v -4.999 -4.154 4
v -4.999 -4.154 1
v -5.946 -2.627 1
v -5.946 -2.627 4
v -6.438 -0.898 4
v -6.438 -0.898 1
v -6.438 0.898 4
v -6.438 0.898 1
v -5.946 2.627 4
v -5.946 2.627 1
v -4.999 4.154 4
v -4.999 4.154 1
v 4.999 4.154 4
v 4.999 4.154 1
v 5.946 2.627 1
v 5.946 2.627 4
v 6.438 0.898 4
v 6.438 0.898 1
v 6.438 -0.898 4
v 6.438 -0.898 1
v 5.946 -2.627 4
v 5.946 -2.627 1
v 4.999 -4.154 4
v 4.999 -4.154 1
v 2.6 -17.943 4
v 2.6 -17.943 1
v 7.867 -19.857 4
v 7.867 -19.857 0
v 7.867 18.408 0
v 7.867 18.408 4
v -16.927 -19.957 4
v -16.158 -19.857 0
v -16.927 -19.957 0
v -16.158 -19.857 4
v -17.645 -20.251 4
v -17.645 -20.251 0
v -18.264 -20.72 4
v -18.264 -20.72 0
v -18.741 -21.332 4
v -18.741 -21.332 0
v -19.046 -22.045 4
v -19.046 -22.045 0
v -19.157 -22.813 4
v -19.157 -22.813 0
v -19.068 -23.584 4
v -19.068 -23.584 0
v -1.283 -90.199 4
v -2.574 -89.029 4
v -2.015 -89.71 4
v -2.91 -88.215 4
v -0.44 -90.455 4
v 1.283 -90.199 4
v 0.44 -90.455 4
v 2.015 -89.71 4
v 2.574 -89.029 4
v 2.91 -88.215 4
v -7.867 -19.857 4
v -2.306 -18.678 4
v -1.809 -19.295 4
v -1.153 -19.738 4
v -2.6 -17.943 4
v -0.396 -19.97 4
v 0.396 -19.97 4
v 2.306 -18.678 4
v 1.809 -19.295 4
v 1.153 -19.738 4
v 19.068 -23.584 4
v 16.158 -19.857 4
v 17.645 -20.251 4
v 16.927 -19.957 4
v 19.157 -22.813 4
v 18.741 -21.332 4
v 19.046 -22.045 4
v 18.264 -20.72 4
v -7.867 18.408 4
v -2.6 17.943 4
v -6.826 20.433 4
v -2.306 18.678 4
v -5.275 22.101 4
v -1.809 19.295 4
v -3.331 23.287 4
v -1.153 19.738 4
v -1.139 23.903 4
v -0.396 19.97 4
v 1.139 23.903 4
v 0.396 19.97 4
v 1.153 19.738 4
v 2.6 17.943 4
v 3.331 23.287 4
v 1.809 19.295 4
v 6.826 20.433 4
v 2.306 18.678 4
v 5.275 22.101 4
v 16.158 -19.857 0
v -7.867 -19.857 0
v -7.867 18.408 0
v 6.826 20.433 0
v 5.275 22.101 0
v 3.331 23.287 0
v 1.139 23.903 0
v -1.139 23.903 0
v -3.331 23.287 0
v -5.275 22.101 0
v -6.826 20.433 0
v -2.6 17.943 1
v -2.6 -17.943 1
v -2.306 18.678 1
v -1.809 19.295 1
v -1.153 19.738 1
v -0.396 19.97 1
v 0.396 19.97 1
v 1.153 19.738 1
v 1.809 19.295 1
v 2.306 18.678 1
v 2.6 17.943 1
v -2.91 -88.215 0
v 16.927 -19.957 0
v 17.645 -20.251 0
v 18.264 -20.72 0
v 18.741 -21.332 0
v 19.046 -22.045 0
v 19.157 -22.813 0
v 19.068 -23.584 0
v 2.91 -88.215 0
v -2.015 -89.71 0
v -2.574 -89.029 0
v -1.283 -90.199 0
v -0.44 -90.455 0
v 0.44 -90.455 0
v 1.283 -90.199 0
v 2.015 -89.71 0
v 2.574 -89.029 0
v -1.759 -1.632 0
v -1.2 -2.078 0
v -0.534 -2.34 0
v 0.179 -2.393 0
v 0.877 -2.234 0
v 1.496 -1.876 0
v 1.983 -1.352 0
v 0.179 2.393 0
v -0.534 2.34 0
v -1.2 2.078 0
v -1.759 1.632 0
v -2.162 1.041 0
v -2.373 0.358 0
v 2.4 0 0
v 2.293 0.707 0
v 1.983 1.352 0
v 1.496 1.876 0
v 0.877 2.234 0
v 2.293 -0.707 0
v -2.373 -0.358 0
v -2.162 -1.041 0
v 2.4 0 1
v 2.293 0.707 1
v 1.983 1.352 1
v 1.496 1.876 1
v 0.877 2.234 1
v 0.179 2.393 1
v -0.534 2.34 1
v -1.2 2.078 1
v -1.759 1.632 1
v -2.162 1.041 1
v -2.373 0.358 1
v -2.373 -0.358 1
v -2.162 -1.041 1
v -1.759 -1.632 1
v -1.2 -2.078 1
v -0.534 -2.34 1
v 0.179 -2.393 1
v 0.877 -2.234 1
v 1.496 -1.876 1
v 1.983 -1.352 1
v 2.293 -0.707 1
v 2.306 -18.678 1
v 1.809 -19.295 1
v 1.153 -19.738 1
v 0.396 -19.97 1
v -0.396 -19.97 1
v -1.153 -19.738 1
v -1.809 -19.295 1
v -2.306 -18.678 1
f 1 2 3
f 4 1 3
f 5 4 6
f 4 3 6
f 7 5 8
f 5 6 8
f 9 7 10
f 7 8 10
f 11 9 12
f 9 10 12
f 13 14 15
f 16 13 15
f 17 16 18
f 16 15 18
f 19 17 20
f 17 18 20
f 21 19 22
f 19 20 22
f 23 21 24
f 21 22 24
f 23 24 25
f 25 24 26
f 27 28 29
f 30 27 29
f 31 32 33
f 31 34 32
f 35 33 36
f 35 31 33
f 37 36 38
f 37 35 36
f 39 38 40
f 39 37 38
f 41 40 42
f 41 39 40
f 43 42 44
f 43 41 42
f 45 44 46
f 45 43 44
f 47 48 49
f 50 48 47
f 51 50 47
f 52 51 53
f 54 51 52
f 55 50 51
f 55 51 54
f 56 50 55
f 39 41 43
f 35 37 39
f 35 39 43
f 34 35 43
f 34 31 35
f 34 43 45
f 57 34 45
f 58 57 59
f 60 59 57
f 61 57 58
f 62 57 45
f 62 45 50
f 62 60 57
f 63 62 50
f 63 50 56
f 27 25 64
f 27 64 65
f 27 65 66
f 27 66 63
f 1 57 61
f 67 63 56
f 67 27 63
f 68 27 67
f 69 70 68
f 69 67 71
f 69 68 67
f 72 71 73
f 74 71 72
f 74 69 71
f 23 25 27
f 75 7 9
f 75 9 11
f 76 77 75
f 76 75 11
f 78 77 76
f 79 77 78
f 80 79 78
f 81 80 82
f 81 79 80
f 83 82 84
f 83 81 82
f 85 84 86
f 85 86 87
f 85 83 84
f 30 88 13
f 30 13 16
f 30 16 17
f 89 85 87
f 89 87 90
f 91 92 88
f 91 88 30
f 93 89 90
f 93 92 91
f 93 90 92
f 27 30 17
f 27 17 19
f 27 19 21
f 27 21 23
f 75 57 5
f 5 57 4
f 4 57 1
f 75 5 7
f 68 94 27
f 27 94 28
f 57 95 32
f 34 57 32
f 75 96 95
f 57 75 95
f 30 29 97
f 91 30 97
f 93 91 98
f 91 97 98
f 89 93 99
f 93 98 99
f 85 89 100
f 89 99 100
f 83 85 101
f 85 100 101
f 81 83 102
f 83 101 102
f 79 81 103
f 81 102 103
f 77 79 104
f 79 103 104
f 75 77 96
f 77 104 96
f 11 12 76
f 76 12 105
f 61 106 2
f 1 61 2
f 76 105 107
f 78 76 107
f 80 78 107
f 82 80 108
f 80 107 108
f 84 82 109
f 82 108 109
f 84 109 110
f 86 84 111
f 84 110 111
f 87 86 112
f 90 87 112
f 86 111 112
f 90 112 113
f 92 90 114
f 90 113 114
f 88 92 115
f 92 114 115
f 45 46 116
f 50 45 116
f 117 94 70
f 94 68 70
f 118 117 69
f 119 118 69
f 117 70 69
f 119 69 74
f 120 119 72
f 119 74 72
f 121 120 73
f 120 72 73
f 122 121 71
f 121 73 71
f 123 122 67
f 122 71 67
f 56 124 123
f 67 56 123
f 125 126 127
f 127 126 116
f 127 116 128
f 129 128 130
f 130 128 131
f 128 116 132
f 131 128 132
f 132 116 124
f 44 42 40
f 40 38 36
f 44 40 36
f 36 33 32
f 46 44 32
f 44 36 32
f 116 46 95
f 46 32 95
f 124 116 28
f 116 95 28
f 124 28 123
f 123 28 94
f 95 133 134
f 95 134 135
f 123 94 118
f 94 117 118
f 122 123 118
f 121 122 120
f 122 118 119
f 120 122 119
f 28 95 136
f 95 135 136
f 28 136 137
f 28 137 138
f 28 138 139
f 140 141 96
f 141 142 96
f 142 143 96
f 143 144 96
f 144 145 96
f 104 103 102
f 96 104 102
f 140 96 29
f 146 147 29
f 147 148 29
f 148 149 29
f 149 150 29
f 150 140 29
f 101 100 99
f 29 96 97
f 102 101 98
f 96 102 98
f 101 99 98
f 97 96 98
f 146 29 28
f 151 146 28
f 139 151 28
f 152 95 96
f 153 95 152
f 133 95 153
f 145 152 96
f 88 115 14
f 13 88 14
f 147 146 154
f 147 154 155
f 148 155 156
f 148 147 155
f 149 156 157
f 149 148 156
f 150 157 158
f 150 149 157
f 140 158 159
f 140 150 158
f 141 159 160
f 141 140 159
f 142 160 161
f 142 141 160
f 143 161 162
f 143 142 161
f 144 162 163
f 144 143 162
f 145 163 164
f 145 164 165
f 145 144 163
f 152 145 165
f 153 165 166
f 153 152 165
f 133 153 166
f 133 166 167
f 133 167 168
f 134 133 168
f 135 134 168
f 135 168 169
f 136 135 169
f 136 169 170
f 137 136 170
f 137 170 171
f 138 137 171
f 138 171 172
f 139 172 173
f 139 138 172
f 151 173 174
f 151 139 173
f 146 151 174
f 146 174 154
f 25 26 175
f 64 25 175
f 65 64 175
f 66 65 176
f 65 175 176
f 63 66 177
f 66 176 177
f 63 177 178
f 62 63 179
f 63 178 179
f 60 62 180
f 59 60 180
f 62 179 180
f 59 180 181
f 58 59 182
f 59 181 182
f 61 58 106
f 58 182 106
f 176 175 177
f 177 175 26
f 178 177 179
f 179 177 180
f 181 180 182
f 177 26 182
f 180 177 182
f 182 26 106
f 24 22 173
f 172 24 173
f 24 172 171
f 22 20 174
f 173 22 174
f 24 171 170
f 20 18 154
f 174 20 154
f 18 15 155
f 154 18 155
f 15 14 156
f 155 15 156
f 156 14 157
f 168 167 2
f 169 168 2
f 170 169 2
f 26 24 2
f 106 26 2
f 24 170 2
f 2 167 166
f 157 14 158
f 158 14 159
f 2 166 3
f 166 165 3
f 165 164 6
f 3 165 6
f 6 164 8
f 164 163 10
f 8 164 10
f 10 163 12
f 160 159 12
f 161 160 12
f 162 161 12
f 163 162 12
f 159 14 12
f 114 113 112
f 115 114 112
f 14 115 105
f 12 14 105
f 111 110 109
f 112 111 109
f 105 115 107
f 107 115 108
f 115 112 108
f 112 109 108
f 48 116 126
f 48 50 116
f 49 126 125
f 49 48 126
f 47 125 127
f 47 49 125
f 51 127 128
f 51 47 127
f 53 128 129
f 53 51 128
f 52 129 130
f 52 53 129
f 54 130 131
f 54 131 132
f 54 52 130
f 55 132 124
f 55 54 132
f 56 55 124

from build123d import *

# Parameters (mm, degrees)
EXTRUDE_1_DEPTH = 4
SKETCH_2_R      = 2.4
EXTRUDE_2_DEPTH = 1
FILLET_1_R      = 3


with BuildPart() as part:
    # 草圖1 → 填料-伸長1 (new body)
    with BuildSketch(Plane.XY):
        with BuildLine():
            Line((-7.867443673, 18.408334232), (-7.867443673, -19.856671438))
            Line((-7.867443673, -19.856671438), (-20, -19.856671438))
            Line((-20, -19.856671438), (0, -99.856671438))
            Line((0, -99.856671438), (20, -19.856671438))
            Line((20, -19.856671438), (7.867443673, -19.856671438))
            Line((7.867443673, -19.856671438), (7.867443673, 18.408334232))
            ThreePointArc((7.867443673, 18.408334232), (0, 23.981275915), (-7.867443673, 18.408334232))
        make_face()
        with BuildLine():
            ThreePointArc((-4.999271035, -4.154189345), (-6.5, 0), (-4.999271035, 4.154189345))
            Line((-4.999271035, 4.154189345), (-2.6, 17.94275172))
            ThreePointArc((-2.6, 17.94275172), (0, 20), (2.6, 17.94275172))
            Line((2.6, 17.94275172), (4.999271035, 4.154189345))
            ThreePointArc((4.999271035, 4.154189345), (6.5, 0), (4.999271035, -4.154189345))
            Line((4.999271035, -4.154189345), (2.6, -17.94275172))
            ThreePointArc((2.6, -17.94275172), (0, -20), (-2.6, -17.94275172))
            Line((-2.6, -17.94275172), (-4.999271035, -4.154189345))
        make_face(mode=Mode.SUBTRACT)
    extrude(amount=EXTRUDE_1_DEPTH)

    # 草圖2 → 填料-伸長2 (add)
    with BuildSketch(Plane.XY):
        with BuildLine():
            Line((-3.702325647, 20.172267208), (4.497563026, 20.172267208))
            ThreePointArc((4.497563026, 20.172267208), (6.068658829, 19.068237677), (7.032818959, 17.407629814))
            Line((7.032818959, 17.407629814), (7.032818959, -20.628324178))
            Line((7.032818959, -20.628324178), (-6.646673958, -20.628324178))
            Line((-6.646673958, -20.628324178), (-6.646673958, 17.471058727))
            ThreePointArc((-6.646673958, 17.471058727), (-5.621736824, 19.309156464), (-3.702325647, 20.172267208))
        make_face()
        Circle(SKETCH_2_R, mode=Mode.SUBTRACT)
    extrude(amount=EXTRUDE_2_DEPTH)

    # 圓角1
    fillet_1_edges = [part.edges().sort_by_distance(p)[0] for p in [
        (20, -19.856671438, 2),
        (0, -99.856671438, 2),
        (-20, -19.856671438, 2),
    ]]
    fillet(fillet_1_edges, radius=FILLET_1_R)


solid = part.part
